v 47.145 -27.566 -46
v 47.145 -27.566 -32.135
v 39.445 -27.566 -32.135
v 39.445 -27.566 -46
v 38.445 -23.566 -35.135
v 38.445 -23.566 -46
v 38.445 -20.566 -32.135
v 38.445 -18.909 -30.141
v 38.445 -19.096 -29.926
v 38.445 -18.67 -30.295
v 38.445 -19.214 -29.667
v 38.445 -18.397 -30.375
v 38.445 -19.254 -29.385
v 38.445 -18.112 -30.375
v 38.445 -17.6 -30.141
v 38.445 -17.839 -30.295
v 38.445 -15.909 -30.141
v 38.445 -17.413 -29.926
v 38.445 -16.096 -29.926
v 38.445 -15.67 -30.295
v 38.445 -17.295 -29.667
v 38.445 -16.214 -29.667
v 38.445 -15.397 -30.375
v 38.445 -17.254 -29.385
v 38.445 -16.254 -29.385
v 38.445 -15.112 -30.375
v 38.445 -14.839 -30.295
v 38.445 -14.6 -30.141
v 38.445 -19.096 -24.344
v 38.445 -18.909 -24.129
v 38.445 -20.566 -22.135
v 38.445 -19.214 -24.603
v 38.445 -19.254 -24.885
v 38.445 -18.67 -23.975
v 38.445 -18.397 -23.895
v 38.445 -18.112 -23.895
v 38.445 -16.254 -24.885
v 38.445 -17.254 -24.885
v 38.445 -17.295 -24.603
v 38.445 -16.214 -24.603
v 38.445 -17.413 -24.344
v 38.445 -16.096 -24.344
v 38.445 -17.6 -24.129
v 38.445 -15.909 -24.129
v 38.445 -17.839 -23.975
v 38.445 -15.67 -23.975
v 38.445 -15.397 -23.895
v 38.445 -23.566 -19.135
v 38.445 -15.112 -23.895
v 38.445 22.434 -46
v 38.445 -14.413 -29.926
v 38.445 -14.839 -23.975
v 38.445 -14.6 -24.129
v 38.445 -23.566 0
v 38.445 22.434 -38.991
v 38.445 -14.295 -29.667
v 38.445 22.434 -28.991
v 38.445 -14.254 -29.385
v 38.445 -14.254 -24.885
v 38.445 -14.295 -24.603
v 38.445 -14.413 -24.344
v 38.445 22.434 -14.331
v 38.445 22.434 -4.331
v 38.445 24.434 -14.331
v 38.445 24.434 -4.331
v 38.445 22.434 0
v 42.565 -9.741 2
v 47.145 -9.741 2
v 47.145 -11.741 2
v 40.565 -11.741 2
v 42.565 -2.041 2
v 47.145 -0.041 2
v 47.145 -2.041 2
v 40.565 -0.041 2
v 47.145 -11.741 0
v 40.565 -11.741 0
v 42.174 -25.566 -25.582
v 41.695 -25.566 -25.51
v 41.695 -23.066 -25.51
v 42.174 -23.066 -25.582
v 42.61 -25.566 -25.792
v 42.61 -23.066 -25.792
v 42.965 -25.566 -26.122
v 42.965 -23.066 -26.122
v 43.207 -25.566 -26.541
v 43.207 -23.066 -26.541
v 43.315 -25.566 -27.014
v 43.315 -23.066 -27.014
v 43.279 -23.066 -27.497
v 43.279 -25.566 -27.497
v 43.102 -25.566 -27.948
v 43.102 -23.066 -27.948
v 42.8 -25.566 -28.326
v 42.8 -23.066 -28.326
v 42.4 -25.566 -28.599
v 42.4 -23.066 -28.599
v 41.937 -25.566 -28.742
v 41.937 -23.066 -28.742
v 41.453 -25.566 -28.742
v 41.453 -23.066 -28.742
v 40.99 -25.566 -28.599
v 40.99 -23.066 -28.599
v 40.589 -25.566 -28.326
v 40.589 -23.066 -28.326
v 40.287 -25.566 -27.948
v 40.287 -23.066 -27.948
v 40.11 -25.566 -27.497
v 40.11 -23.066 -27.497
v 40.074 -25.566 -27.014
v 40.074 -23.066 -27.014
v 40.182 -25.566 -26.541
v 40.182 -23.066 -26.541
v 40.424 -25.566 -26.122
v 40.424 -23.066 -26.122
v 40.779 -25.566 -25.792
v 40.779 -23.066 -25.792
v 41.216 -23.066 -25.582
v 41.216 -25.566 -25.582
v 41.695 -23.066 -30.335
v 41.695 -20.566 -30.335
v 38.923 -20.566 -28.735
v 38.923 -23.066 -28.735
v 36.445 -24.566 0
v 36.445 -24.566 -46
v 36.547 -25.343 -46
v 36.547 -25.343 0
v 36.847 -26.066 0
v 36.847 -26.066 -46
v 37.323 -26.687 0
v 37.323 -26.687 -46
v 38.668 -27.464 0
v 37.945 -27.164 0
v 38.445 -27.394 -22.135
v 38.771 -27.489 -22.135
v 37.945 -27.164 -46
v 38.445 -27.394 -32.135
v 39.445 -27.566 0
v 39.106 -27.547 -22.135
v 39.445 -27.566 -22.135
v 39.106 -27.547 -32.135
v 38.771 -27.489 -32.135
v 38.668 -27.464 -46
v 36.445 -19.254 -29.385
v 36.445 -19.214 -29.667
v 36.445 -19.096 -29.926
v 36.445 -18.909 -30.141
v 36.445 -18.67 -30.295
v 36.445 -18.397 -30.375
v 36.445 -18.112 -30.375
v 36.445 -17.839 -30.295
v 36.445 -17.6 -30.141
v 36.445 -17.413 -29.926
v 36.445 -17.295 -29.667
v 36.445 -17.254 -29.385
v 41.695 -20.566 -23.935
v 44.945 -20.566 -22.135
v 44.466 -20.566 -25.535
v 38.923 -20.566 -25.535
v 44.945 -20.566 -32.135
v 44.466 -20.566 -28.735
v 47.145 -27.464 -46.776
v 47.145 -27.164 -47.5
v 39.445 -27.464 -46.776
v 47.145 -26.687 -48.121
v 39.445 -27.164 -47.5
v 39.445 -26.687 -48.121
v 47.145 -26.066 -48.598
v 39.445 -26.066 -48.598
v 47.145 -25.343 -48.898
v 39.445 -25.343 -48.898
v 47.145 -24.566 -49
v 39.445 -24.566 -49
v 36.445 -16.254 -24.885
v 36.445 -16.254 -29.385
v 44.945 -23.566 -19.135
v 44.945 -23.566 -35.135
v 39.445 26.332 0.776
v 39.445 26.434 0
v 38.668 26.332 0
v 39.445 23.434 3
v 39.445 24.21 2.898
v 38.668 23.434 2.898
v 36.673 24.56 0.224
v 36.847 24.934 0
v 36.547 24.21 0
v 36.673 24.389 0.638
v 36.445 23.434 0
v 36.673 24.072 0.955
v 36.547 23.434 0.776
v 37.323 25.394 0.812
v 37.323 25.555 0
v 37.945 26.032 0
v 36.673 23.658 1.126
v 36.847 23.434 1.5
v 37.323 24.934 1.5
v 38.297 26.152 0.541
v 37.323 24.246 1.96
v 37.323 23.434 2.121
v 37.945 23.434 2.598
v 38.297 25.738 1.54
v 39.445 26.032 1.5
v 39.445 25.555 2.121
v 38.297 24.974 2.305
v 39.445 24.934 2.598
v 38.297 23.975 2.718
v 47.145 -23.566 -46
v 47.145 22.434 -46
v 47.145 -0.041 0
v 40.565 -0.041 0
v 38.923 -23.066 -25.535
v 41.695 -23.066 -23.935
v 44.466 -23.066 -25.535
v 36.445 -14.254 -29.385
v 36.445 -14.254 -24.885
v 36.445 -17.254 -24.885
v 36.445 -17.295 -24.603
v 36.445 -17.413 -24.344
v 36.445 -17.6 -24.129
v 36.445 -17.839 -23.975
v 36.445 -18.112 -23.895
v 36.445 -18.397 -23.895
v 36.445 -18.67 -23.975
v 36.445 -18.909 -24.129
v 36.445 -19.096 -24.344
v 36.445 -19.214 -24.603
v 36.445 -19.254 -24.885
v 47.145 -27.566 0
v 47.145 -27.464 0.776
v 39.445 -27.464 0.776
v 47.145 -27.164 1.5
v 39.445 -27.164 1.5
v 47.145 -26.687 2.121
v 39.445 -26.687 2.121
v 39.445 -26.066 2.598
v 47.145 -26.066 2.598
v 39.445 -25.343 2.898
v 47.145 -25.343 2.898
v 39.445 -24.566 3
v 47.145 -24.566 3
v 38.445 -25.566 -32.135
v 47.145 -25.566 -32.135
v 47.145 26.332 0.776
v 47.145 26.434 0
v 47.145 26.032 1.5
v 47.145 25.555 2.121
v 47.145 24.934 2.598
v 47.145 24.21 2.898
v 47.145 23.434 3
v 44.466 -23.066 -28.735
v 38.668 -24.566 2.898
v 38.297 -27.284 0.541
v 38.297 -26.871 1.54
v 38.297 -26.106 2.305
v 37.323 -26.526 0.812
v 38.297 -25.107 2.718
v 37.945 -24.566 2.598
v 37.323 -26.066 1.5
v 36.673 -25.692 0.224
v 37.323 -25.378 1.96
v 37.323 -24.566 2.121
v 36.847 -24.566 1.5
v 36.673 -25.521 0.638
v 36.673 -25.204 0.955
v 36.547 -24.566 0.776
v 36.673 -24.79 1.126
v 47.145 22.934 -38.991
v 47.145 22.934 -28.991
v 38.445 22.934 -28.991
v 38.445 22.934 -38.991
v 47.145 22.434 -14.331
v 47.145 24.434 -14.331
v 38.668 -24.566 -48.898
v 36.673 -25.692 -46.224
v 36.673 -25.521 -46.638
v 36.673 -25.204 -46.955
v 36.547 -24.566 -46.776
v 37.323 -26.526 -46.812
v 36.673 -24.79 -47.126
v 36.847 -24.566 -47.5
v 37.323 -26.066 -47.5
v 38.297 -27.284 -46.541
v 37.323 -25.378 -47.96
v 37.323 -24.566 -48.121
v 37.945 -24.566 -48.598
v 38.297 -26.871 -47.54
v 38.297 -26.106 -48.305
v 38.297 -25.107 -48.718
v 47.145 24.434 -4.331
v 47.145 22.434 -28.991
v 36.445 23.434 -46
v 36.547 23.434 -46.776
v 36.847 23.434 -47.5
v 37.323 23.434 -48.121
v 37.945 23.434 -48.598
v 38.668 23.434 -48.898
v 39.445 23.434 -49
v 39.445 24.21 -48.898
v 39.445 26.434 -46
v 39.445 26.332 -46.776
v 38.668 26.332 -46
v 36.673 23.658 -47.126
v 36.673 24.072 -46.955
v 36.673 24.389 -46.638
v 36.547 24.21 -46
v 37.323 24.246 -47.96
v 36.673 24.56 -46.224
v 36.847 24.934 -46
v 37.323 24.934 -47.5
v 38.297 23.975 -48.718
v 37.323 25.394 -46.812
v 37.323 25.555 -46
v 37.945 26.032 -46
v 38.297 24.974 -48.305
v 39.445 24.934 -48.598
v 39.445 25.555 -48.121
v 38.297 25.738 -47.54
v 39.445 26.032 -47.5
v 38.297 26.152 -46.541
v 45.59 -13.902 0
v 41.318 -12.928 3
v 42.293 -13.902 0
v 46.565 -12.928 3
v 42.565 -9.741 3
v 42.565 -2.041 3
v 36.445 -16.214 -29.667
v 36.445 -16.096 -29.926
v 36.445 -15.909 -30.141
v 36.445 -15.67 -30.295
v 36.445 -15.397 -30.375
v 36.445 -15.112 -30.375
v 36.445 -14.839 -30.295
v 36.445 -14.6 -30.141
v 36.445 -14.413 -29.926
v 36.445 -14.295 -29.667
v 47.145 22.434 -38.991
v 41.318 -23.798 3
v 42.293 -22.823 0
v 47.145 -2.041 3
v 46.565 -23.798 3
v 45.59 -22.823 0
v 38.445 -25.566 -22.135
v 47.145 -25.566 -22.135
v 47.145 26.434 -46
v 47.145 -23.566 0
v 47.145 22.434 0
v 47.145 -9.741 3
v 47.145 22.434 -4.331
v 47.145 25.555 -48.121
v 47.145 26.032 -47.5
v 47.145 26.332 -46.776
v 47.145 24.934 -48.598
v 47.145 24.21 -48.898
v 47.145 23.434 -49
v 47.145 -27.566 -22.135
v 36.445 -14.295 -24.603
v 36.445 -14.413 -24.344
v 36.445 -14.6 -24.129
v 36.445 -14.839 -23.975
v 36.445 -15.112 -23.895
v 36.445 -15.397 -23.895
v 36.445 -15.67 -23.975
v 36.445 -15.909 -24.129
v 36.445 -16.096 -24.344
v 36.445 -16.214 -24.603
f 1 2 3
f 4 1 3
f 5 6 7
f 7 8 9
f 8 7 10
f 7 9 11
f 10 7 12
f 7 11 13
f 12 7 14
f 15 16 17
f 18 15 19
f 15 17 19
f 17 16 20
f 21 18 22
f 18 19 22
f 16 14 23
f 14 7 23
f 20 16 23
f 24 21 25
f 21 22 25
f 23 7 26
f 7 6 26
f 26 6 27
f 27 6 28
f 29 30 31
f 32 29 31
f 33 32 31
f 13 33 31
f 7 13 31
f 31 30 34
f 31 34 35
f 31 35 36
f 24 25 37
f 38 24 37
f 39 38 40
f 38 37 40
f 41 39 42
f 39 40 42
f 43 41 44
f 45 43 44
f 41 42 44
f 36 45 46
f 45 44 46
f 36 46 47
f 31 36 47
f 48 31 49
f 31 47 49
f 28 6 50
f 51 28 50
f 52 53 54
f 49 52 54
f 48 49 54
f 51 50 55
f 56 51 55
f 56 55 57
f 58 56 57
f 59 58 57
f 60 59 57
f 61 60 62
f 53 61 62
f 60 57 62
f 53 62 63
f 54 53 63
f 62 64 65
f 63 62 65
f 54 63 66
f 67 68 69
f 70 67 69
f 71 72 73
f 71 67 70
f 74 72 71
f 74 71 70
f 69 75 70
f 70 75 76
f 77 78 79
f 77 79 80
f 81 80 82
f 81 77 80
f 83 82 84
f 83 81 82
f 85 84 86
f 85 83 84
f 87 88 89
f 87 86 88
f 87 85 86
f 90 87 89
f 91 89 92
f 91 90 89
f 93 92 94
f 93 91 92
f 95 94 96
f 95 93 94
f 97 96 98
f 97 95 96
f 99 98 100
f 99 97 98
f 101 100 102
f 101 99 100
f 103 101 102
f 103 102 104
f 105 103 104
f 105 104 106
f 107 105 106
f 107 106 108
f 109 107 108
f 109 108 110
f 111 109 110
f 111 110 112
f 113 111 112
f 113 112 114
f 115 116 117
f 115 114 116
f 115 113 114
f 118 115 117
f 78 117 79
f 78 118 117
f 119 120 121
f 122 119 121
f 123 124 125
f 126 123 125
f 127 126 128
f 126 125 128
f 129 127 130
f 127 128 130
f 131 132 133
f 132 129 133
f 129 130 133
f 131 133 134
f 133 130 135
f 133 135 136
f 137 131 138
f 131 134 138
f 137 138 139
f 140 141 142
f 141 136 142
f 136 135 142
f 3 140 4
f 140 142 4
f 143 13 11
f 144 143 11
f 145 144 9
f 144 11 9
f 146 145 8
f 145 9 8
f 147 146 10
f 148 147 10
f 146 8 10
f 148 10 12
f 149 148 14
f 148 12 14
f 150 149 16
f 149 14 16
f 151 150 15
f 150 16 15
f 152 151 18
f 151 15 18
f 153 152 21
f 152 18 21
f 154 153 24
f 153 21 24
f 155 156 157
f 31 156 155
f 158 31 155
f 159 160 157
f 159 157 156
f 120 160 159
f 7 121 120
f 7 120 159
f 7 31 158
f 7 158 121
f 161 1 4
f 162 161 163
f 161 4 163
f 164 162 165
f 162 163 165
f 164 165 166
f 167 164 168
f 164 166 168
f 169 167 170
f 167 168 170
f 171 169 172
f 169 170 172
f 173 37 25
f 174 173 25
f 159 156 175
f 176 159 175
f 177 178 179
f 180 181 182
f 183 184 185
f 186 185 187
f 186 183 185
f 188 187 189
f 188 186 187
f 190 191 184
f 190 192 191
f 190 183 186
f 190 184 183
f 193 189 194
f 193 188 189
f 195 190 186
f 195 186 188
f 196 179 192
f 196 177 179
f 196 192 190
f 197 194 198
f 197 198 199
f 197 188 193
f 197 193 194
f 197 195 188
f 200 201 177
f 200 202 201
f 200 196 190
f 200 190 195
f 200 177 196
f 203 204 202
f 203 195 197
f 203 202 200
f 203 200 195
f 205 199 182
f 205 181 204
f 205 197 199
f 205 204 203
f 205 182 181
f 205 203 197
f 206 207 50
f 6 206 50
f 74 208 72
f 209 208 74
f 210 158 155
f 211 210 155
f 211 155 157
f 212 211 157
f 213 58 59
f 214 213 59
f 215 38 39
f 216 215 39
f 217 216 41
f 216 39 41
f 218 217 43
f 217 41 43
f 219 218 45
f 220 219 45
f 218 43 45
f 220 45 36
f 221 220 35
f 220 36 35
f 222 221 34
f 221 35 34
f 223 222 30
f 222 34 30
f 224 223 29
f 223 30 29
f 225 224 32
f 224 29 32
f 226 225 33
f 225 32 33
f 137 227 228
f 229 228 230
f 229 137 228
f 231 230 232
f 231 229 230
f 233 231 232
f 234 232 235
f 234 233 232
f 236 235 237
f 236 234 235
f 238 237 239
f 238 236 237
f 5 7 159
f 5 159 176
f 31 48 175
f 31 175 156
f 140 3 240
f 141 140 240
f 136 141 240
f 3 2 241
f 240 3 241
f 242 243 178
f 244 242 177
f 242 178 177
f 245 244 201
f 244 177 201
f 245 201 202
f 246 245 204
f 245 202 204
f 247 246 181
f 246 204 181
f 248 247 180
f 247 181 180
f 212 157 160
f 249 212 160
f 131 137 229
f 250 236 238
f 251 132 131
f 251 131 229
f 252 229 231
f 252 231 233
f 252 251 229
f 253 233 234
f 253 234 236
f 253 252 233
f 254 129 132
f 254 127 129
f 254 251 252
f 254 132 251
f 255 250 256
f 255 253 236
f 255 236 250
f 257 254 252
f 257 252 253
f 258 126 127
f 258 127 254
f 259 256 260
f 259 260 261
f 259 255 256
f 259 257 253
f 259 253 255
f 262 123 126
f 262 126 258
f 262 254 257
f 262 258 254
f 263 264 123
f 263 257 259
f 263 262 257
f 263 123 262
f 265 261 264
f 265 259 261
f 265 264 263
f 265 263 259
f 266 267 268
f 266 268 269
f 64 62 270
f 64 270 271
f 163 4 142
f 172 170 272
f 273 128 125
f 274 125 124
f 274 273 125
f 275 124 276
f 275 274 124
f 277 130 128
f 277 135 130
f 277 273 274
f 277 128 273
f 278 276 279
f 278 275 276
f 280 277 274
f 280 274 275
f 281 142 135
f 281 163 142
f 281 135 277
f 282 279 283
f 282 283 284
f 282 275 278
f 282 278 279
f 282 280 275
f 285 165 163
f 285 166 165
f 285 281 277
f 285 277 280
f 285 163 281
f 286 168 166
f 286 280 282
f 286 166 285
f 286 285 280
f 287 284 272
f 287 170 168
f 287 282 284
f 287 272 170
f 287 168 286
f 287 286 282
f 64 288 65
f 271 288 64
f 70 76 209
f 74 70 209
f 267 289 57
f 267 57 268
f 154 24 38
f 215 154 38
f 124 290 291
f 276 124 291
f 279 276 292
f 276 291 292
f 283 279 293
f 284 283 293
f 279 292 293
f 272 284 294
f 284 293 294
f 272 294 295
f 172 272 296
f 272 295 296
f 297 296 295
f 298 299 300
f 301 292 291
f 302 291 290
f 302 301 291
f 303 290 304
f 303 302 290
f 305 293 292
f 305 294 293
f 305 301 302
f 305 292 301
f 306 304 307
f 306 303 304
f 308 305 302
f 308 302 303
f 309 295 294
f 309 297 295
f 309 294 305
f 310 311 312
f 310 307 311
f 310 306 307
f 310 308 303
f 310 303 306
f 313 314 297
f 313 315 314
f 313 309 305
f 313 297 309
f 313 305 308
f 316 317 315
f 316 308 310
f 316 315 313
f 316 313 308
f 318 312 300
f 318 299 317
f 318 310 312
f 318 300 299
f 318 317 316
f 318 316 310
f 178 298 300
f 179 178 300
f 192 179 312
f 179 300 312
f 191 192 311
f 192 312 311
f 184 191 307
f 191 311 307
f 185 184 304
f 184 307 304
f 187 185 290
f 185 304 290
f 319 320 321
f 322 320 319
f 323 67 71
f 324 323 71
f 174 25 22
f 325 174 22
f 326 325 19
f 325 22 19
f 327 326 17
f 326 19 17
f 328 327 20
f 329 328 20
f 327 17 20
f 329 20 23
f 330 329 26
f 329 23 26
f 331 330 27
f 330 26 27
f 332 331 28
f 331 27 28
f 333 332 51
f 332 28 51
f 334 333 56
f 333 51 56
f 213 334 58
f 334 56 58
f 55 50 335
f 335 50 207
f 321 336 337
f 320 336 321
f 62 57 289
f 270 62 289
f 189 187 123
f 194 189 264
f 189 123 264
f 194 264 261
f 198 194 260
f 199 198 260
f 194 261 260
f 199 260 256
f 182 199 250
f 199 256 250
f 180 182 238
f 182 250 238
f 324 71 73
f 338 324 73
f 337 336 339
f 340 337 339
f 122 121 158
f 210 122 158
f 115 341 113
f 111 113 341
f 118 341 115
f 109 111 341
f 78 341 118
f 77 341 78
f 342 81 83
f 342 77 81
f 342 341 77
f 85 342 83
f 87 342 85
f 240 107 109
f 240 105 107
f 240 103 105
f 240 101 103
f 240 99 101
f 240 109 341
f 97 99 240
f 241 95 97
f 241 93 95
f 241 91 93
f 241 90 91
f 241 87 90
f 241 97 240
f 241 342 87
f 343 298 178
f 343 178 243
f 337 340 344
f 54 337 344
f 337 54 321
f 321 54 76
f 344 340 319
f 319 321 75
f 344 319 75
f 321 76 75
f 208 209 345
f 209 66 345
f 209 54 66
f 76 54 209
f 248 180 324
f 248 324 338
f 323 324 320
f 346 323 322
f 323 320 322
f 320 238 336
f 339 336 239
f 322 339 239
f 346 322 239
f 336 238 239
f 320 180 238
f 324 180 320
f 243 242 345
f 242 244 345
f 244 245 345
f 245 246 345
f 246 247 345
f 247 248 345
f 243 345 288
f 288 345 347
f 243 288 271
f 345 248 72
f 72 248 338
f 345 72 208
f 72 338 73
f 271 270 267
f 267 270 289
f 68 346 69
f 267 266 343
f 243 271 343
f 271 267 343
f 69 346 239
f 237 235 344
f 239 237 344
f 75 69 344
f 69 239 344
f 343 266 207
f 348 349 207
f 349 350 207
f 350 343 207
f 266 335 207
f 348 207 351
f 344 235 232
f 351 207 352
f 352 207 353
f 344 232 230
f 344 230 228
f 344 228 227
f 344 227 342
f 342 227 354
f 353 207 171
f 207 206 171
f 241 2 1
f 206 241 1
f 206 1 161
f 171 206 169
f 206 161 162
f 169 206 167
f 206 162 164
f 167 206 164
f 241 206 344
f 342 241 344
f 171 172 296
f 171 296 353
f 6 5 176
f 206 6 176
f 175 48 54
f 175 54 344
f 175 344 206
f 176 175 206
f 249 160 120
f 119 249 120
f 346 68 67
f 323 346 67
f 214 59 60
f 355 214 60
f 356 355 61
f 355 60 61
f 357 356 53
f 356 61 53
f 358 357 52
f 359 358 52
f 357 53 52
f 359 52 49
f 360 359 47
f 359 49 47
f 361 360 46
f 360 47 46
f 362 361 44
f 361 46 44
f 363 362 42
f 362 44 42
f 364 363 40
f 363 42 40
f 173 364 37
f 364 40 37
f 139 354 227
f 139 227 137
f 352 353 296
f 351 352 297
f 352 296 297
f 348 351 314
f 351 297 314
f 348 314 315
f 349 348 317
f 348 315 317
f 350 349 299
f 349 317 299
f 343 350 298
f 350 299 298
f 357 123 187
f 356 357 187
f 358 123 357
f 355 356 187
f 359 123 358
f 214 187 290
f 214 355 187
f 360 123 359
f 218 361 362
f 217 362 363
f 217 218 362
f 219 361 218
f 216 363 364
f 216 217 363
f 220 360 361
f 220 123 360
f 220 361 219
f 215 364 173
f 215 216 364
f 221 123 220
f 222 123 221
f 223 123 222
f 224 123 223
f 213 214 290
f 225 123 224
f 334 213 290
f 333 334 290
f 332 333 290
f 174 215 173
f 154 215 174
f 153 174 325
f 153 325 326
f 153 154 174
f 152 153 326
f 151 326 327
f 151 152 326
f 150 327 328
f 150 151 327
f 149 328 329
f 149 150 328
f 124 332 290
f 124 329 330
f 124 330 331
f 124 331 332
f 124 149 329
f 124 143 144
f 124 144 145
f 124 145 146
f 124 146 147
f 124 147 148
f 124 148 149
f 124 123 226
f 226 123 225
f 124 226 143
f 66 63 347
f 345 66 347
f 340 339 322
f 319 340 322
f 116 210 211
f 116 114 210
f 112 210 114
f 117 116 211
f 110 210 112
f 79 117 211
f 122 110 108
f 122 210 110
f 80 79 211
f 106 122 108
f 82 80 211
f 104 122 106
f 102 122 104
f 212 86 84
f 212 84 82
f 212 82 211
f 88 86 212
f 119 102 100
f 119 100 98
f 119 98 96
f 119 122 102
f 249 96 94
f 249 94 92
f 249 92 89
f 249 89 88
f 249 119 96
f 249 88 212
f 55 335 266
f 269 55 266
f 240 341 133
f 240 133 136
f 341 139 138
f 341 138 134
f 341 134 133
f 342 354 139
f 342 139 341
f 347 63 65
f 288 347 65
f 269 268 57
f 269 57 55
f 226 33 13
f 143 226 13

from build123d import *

# Parameters (mm, degrees)
CROQUIS1_W                   = 3.246579248
CROQUIS1_H                   = 8.852829877
SALIENTE_EXTRUIR1_DEPTH      = 2
CROQUIS5_W                   = 9
CROQUIS5_H                   = 0.5
ARREGLO_IMPRESION1_DEPTH     = 2
CROQUIS6_W                   = 9
CROQUIS6_H                   = 48
SALIENTE_EXTRUIR4_DEPTH      = 2
CROQUIS7_W                   = 9
CROQUIS7_H                   = 48
SALIENTE_EXTRUIR5_DEPTH      = 2
CROQUIS8_W                   = 9
CROQUIS8_H                   = 50
SALIENTE_EXTRUIR6_DEPTH      = 2
SALIENTE_EXTRUIR7_DEPTH      = 1.7
SALIENTE_EXTRUIR7_DEPTH_BACK = 0.3
CROQUIS9_W                   = 50
CROQUIS9_H                   = 50
CROQUIS10_W                  = 10
CROQUIS10_H                  = 0.5
CORTAR_EXTRUIR1_DEPTH        = 8.700001
CROQUIS11_W                  = 3.246579248
CROQUIS11_H                  = 8.852829877
SALIENTE_EXTRUIR8_DEPTH      = 1
CROQUIS12_W                  = 10.7
CROQUIS12_H                  = 51
SALIENTE_EXTRUIR9_DEPTH      = 2
CROQUIS13_W                  = 10.7
CROQUIS13_H                  = 52
SALIENTE_EXTRUIR10_DEPTH     = 1
CROQUIS14_W                  = 10.7
CROQUIS14_H                  = 52
SALIENTE_EXTRUIR11_DEPTH     = 2
SALIENTE_EXTRUIR12_DEPTH     = 6.5
CORTAR_EXTRUIR2_START        = -7
CROQUIS19_R                  = 1.625
CORTAR_EXTRUIR2_DEPTH        = 7
CORTAR_EXTRUIR3_DEPTH        = 2.5
CROQUIS22_W                  = 10
CROQUIS22_H                  = 2
CORTAR_EXTRUIR4_DEPTH        = 8.7
CORTAR_EXTRUIR5_START        = -10.7
CORTAR_EXTRUIR5_DEPTH        = 10.7
REDONDEO4_R                  = 3
CROQUIS24_W                  = 5.246579248
CROQUIS24_H                  = 10.87000641
CORTAR_EXTRUIR6_DEPTH        = 3
CORTAR_EXTRUIR6_DRAFT        = -18
CROQUIS25_W                  = 6.58
CROQUIS25_H                  = 11.7
CORTAR_EXTRUIR7_DEPTH        = 2


with BuildPart() as part:
    # Croquis1 → Saliente-Extruir1 (new body)
    with BuildSketch(Plane.XY):
        Polygon((47.144751496, 21.933935563), (38.144751496, 21.933935563), (38.144751496, -23.066064437), (47.144751496, -23.066064437), (47.144751496, -9.741064437), (42.564751496, -9.741064437), (42.564751496, -2.041064437), (47.144751496, -2.041064437), align=None)
        with Locations((43.941461872, -18.353940173)):
            Rectangle(CROQUIS1_W, CROQUIS1_H, mode=Mode.SUBTRACT)
    extrude(amount=SALIENTE_EXTRUIR1_DEPTH)

    # Croquis5 → Arreglo_impresion1 (add)
    with BuildSketch(Plane.XY.offset(2)):
        with Locations((42.644751496, -23.316064437)):
            Rectangle(CROQUIS5_W, CROQUIS5_H)
        with Locations((42.644751496, 22.183935563)):
            Rectangle(CROQUIS5_W, CROQUIS5_H)
    extrude(amount=-ARREGLO_IMPRESION1_DEPTH)

    # Croquis6 → Saliente-Extruir4 (add)
    with BuildSketch(Plane.XZ.offset(23.566064437)):
        with Locations((42.644751496, -22)):
            Rectangle(CROQUIS6_W, CROQUIS6_H)
    extrude(amount=SALIENTE_EXTRUIR4_DEPTH)

    # Croquis7 → Saliente-Extruir5 (add)
    with BuildSketch(Plane(origin=(0, 0, -46), x_dir=(-1, 0, 0), z_dir=(0, 0, -1))):
        with Locations((-42.644751496, -1.566064437)):
            Rectangle(CROQUIS7_W, CROQUIS7_H)
    extrude(amount=SALIENTE_EXTRUIR5_DEPTH)

    # Croquis8 → Saliente-Extruir6 (add)
    with BuildSketch(Plane(origin=(0, 22.433935563, 0), x_dir=(1, 0, 0), z_dir=(0, 1, 0))):
        with Locations((42.644751496, 23)):
            Rectangle(CROQUIS8_W, CROQUIS8_H)
    extrude(amount=SALIENTE_EXTRUIR6_DEPTH)

    # Croquis9 → Saliente-Extruir7 (add, two sides: drawn at the far end of the back side and taken through both)
    with BuildSketch(Plane.ZY.offset(-38.144751496).offset(-SALIENTE_EXTRUIR7_DEPTH_BACK)):
        with Locations((-23, -0.566064437)):
            Rectangle(CROQUIS9_W, CROQUIS9_H)
        with BuildLine():
            Line((-29.385, -14.254496437), (-24.885, -14.254496437))
            ThreePointArc((-24.885, -14.254496437), (-23.885, -15.254496437), (-24.885, -16.254496437))
            Line((-24.885, -16.254496437), (-29.385, -16.254496437))
            ThreePointArc((-29.385, -16.254496437), (-30.385, -15.254496437), (-29.385, -14.254496437))
        make_face(mode=Mode.SUBTRACT)
        with BuildLine():
            Line((-29.385, -17.254496437), (-24.885, -17.254496437))
            ThreePointArc((-24.885, -17.254496437), (-23.885, -18.254496437), (-24.885, -19.254496437))
            Line((-24.885, -19.254496437), (-29.385, -19.254496437))
            ThreePointArc((-29.385, -19.254496437), (-30.385, -18.254496437), (-29.385, -17.254496437))
        make_face(mode=Mode.SUBTRACT)
    extrude(amount=SALIENTE_EXTRUIR7_DEPTH + SALIENTE_EXTRUIR7_DEPTH_BACK)

    # Croquis10 → Cortar-Extruir1 (cut)
    with BuildSketch(Plane(origin=(47.144751496, 0, 0), x_dir=(0, 0, -1), z_dir=(1, 0, 0))):
        with Locations((33.991483973, 22.683935563)):
            Rectangle(CROQUIS10_W, CROQUIS10_H)
    extrude(amount=-CORTAR_EXTRUIR1_DEPTH, mode=Mode.SUBTRACT)

    # Croquis11 → Saliente-Extruir8 (add)
    with BuildSketch(Plane.XY.offset(2)):
        Polygon((47.144751496, 24.433935563), (36.444751496, 24.433935563), (36.444751496, -25.566064437), (47.144751496, -25.566064437), (47.144751496, -9.741064437), (42.564751496, -9.741064437), (42.564751496, -2.041064437), (47.144751496, -2.041064437), align=None)
        with Locations((43.941461872, -18.353940173)):
            Rectangle(CROQUIS11_W, CROQUIS11_H, mode=Mode.SUBTRACT)
    extrude(amount=SALIENTE_EXTRUIR8_DEPTH)

    # Croquis12 → Saliente-Extruir9 (add)
    with BuildSketch(Plane.XZ.offset(25.566064437)):
        with Locations((41.794751496, -22.5)):
            Rectangle(CROQUIS12_W, CROQUIS12_H)
    extrude(amount=SALIENTE_EXTRUIR9_DEPTH)

    # Croquis13 → Saliente-Extruir10 (add)
    with BuildSketch(Plane(origin=(0, 0, -48), x_dir=(-1, 0, 0), z_dir=(0, 0, -1))):
        with Locations((-41.794751496, -1.566064437)):
            Rectangle(CROQUIS13_W, CROQUIS13_H)
    extrude(amount=SALIENTE_EXTRUIR10_DEPTH)

    # Croquis14 → Saliente-Extruir11 (add)
    with BuildSketch(Plane(origin=(0, 24.433935563, 0), x_dir=(1, 0, 0), z_dir=(0, 1, 0))):
        with Locations((41.794751496, 23)):
            Rectangle(CROQUIS14_W, CROQUIS14_H)
    extrude(amount=SALIENTE_EXTRUIR11_DEPTH)

    # Croquis17 → Saliente-Extruir12 (add)
    with BuildSketch(Plane(origin=(38.444751496, 0, 0), x_dir=(0, 0, -1), z_dir=(1, 0, 0))):
        Polygon((22.135, -20.566064437), (32.135, -20.566064437), (35.135, -23.566064437), (19.135, -23.566064437), align=None)
    extrude(amount=SALIENTE_EXTRUIR12_DEPTH)

    # Croquis19 → Cortar-Extruir2 (cut)
    with BuildSketch(Plane(origin=(0, -20.566064437, 0), x_dir=(1, 0, 0), z_dir=(0, 1, 0)).offset(CORTAR_EXTRUIR2_START)):
        with Locations(Location((41.694751496, 27.135, 0), (0, 0, 270))):
            Circle(CROQUIS19_R)
    extrude(amount=CORTAR_EXTRUIR2_DEPTH, mode=Mode.SUBTRACT)

    # Croquis20 → Cortar-Extruir3 (cut)
    with BuildSketch(Plane(origin=(0, -20.566064437, 0), x_dir=(1, 0, 0), z_dir=(0, 1, 0))):
        Polygon((41.694751496, 30.335), (38.923470204, 28.735), (38.923470204, 25.535), (41.694751496, 23.935), (44.466032788, 25.535), (44.466032788, 28.735), align=None)
    extrude(amount=-CORTAR_EXTRUIR3_DEPTH, mode=Mode.SUBTRACT)

    # Croquis22 → Cortar-Extruir4 (cut)
    with BuildSketch(Plane(origin=(47.144751496, 0, 0), x_dir=(0, 0, -1), z_dir=(1, 0, 0))):
        with Locations((27.135, -26.566064437)):
            Rectangle(CROQUIS22_W, CROQUIS22_H)
        with Locations((9.331412976, 23.433935563)):
            Rectangle(CROQUIS22_W, CROQUIS22_H)
    extrude(amount=-CORTAR_EXTRUIR4_DEPTH, mode=Mode.SUBTRACT)

    # Croquis23 → Cortar-Extruir5 (cut)
    with BuildSketch(Plane(origin=(47.144751496, 0, 0), x_dir=(0, 0, -1), z_dir=(1, 0, 0)).offset(CORTAR_EXTRUIR5_START)):
        with BuildLine():
            Line((-3, -27.566064437), (0, -27.566064437))
            ThreePointArc((0, -27.566064437), (-2.121320344, -26.687384781), (-3, -24.566064437))
            Line((-3, -24.566064437), (-3, -27.566064437))
        make_face()
        with BuildLine():
            Line((-3, 26.433935563), (0, 26.433935563))
            ThreePointArc((0, 26.433935563), (-2.121320344, 25.555255907), (-3, 23.433935563))
            Line((-3, 23.433935563), (-3, 26.433935563))
        make_face()
        with BuildLine():
            Line((49, 26.433935563), (49, 23.433935563))
            ThreePointArc((49, 23.433935563), (48.121320344, 25.555255907), (46, 26.433935563))
            Line((46, 26.433935563), (49, 26.433935563))
        make_face()
        with BuildLine():
            Line((49, -27.566064437), (46, -27.566064437))
            ThreePointArc((46, -27.566064437), (48.121320344, -26.687384781), (49, -24.566064437))
            Line((49, -24.566064437), (49, -27.566064437))
        make_face()
    extrude(amount=CORTAR_EXTRUIR5_DEPTH, mode=Mode.SUBTRACT)

    # Redondeo4
    # the kernel refuses this fillet: 3 mm, written as the material it takes off along each edge
    with BuildSketch(Plane(origin=(36.444751496, -24.566064437, 0), x_dir=(0, -1, 0), z_dir=(0, 0, -1))) as redondeo4_piece_1:
        with BuildLine():
            CenterArc((3 - REDONDEO4_R, -REDONDEO4_R), REDONDEO4_R, 360, 90)
            Line((3, -REDONDEO4_R), (3, 0))
            Line((3, 0), (3 - REDONDEO4_R, 0))
        make_face()
    revolve(axis=Axis((36.444751496, -24.566064437, 0), (-1, 0, 0)), revolution_arc=90, mode=Mode.SUBTRACT)
    with BuildSketch(Plane(origin=(36.444751496, -24.566064437, 3), x_dir=(0, 0, -1), z_dir=(0, 1, 0)), Plane(origin=(36.444751496, 23.433935563, -49), x_dir=(0, 0, 1), z_dir=(0, -1, 0))) as redondeo4_piece_2:
        with BuildLine():
            CenterArc((REDONDEO4_R, -REDONDEO4_R), REDONDEO4_R, 90, 90)
            Line((0, -REDONDEO4_R), (0, 0))
            Line((0, 0), (REDONDEO4_R, 0))
        make_face()
    extrude(amount=48, mode=Mode.SUBTRACT)
    with BuildSketch(Plane(origin=(36.444751496, 23.433935563, 0), x_dir=(0, 1, 0), z_dir=(0, 0, -1))) as redondeo4_piece_3:
        with BuildLine():
            CenterArc((3 - REDONDEO4_R, REDONDEO4_R), REDONDEO4_R, 270, 90)
            Line((3, REDONDEO4_R), (3, 0))
            Line((3, 0), (3 - REDONDEO4_R, 0))
        make_face()
    revolve(axis=Axis((36.444751496, 23.433935563, 0), (1, 0, 0)), revolution_arc=90, mode=Mode.SUBTRACT)
    with BuildSketch(Plane(origin=(36.444751496, 26.433935563, -46), x_dir=(0, -1, 0), z_dir=(0, 0, 1))) as redondeo4_piece_4:
        with BuildLine():
            CenterArc((REDONDEO4_R, REDONDEO4_R), REDONDEO4_R, 180, 90)
            Line((0, REDONDEO4_R), (0, 0))
            Line((0, 0), (REDONDEO4_R, 0))
        make_face()
    extrude(amount=46, mode=Mode.SUBTRACT)
    with BuildSketch(Plane(origin=(36.444751496, 23.433935563, -46), x_dir=(0, 0, -1), z_dir=(0, -1, 0))) as redondeo4_piece_5:
        with BuildLine():
            CenterArc((3 - REDONDEO4_R, REDONDEO4_R), REDONDEO4_R, 270, 90)
            Line((3, REDONDEO4_R), (3, 0))
            Line((3, 0), (3 - REDONDEO4_R, 0))
        make_face()
    revolve(axis=Axis((36.444751496, 23.433935563, -46), (1, 0, 0)), revolution_arc=90, mode=Mode.SUBTRACT)
    with BuildSketch(Plane(origin=(36.444751496, -24.566064437, -46), x_dir=(0, -1, 0), z_dir=(0, 0, 1))) as redondeo4_piece_6:
        with BuildLine():
            CenterArc((3 - REDONDEO4_R, REDONDEO4_R), REDONDEO4_R, 270, 90)
            Line((3, REDONDEO4_R), (3, 0))
            Line((3, 0), (3 - REDONDEO4_R, 0))
        make_face()
    revolve(axis=Axis((36.444751496, -24.566064437, -46), (1, 0, 0)), revolution_arc=90, mode=Mode.SUBTRACT)
    with BuildSketch(Plane(origin=(36.444751496, -27.566064437, -46), x_dir=(0, 1, 0), z_dir=(0, 0, 1))) as redondeo4_piece_7:
        with BuildLine():
            CenterArc((REDONDEO4_R, -REDONDEO4_R), REDONDEO4_R, 90, 90)
            Line((0, -REDONDEO4_R), (0, 0))
            Line((0, 0), (REDONDEO4_R, 0))
        make_face()
    extrude(amount=46, mode=Mode.SUBTRACT)


with BuildPart() as cortar_extruir6_tool:
    # Croquis24 → Cortar-Extruir6 (with draft: the straight prism first)
    with BuildSketch(Plane.XY.offset(3)):
        with Locations((43.941461872, -18.36252844)):
            Rectangle(CROQUIS24_W, CROQUIS24_H)
    extrude(amount=-CORTAR_EXTRUIR6_DEPTH)
    # Cortar-Extruir6: the draft: its side faces are tilted about the plane it starts from
    cortar_extruir6_sides = [cortar_extruir6_tool.faces().sort_by_distance(p)[0] for p in [
        (43.941461872, -23.797531645, 1.5),
        (46.564751496, -18.36252844, 1.5),
        (43.941461872, -12.927525235, 1.5),
        (41.318172248, -18.36252844, 1.5),
    ]]
    draft(cortar_extruir6_sides, Plane.XY.offset(3), CORTAR_EXTRUIR6_DRAFT)


with BuildPart() as part_1:
    add(part.part)

    # Cortar-Extruir6: cut by cortar_extruir6_tool
    add(cortar_extruir6_tool.part, mode=Mode.SUBTRACT)

    # Croquis25 → Cortar-Extruir7 (cut)
    with BuildSketch(Plane(origin=(0, 0, 0), x_dir=(-1, 0, 0), z_dir=(0, 0, -1))):
        with Locations((-43.854751496, -5.891064437)):
            Rectangle(CROQUIS25_W, CROQUIS25_H)
    extrude(amount=-CORTAR_EXTRUIR7_DEPTH, mode=Mode.SUBTRACT)


solid = part_1.part
